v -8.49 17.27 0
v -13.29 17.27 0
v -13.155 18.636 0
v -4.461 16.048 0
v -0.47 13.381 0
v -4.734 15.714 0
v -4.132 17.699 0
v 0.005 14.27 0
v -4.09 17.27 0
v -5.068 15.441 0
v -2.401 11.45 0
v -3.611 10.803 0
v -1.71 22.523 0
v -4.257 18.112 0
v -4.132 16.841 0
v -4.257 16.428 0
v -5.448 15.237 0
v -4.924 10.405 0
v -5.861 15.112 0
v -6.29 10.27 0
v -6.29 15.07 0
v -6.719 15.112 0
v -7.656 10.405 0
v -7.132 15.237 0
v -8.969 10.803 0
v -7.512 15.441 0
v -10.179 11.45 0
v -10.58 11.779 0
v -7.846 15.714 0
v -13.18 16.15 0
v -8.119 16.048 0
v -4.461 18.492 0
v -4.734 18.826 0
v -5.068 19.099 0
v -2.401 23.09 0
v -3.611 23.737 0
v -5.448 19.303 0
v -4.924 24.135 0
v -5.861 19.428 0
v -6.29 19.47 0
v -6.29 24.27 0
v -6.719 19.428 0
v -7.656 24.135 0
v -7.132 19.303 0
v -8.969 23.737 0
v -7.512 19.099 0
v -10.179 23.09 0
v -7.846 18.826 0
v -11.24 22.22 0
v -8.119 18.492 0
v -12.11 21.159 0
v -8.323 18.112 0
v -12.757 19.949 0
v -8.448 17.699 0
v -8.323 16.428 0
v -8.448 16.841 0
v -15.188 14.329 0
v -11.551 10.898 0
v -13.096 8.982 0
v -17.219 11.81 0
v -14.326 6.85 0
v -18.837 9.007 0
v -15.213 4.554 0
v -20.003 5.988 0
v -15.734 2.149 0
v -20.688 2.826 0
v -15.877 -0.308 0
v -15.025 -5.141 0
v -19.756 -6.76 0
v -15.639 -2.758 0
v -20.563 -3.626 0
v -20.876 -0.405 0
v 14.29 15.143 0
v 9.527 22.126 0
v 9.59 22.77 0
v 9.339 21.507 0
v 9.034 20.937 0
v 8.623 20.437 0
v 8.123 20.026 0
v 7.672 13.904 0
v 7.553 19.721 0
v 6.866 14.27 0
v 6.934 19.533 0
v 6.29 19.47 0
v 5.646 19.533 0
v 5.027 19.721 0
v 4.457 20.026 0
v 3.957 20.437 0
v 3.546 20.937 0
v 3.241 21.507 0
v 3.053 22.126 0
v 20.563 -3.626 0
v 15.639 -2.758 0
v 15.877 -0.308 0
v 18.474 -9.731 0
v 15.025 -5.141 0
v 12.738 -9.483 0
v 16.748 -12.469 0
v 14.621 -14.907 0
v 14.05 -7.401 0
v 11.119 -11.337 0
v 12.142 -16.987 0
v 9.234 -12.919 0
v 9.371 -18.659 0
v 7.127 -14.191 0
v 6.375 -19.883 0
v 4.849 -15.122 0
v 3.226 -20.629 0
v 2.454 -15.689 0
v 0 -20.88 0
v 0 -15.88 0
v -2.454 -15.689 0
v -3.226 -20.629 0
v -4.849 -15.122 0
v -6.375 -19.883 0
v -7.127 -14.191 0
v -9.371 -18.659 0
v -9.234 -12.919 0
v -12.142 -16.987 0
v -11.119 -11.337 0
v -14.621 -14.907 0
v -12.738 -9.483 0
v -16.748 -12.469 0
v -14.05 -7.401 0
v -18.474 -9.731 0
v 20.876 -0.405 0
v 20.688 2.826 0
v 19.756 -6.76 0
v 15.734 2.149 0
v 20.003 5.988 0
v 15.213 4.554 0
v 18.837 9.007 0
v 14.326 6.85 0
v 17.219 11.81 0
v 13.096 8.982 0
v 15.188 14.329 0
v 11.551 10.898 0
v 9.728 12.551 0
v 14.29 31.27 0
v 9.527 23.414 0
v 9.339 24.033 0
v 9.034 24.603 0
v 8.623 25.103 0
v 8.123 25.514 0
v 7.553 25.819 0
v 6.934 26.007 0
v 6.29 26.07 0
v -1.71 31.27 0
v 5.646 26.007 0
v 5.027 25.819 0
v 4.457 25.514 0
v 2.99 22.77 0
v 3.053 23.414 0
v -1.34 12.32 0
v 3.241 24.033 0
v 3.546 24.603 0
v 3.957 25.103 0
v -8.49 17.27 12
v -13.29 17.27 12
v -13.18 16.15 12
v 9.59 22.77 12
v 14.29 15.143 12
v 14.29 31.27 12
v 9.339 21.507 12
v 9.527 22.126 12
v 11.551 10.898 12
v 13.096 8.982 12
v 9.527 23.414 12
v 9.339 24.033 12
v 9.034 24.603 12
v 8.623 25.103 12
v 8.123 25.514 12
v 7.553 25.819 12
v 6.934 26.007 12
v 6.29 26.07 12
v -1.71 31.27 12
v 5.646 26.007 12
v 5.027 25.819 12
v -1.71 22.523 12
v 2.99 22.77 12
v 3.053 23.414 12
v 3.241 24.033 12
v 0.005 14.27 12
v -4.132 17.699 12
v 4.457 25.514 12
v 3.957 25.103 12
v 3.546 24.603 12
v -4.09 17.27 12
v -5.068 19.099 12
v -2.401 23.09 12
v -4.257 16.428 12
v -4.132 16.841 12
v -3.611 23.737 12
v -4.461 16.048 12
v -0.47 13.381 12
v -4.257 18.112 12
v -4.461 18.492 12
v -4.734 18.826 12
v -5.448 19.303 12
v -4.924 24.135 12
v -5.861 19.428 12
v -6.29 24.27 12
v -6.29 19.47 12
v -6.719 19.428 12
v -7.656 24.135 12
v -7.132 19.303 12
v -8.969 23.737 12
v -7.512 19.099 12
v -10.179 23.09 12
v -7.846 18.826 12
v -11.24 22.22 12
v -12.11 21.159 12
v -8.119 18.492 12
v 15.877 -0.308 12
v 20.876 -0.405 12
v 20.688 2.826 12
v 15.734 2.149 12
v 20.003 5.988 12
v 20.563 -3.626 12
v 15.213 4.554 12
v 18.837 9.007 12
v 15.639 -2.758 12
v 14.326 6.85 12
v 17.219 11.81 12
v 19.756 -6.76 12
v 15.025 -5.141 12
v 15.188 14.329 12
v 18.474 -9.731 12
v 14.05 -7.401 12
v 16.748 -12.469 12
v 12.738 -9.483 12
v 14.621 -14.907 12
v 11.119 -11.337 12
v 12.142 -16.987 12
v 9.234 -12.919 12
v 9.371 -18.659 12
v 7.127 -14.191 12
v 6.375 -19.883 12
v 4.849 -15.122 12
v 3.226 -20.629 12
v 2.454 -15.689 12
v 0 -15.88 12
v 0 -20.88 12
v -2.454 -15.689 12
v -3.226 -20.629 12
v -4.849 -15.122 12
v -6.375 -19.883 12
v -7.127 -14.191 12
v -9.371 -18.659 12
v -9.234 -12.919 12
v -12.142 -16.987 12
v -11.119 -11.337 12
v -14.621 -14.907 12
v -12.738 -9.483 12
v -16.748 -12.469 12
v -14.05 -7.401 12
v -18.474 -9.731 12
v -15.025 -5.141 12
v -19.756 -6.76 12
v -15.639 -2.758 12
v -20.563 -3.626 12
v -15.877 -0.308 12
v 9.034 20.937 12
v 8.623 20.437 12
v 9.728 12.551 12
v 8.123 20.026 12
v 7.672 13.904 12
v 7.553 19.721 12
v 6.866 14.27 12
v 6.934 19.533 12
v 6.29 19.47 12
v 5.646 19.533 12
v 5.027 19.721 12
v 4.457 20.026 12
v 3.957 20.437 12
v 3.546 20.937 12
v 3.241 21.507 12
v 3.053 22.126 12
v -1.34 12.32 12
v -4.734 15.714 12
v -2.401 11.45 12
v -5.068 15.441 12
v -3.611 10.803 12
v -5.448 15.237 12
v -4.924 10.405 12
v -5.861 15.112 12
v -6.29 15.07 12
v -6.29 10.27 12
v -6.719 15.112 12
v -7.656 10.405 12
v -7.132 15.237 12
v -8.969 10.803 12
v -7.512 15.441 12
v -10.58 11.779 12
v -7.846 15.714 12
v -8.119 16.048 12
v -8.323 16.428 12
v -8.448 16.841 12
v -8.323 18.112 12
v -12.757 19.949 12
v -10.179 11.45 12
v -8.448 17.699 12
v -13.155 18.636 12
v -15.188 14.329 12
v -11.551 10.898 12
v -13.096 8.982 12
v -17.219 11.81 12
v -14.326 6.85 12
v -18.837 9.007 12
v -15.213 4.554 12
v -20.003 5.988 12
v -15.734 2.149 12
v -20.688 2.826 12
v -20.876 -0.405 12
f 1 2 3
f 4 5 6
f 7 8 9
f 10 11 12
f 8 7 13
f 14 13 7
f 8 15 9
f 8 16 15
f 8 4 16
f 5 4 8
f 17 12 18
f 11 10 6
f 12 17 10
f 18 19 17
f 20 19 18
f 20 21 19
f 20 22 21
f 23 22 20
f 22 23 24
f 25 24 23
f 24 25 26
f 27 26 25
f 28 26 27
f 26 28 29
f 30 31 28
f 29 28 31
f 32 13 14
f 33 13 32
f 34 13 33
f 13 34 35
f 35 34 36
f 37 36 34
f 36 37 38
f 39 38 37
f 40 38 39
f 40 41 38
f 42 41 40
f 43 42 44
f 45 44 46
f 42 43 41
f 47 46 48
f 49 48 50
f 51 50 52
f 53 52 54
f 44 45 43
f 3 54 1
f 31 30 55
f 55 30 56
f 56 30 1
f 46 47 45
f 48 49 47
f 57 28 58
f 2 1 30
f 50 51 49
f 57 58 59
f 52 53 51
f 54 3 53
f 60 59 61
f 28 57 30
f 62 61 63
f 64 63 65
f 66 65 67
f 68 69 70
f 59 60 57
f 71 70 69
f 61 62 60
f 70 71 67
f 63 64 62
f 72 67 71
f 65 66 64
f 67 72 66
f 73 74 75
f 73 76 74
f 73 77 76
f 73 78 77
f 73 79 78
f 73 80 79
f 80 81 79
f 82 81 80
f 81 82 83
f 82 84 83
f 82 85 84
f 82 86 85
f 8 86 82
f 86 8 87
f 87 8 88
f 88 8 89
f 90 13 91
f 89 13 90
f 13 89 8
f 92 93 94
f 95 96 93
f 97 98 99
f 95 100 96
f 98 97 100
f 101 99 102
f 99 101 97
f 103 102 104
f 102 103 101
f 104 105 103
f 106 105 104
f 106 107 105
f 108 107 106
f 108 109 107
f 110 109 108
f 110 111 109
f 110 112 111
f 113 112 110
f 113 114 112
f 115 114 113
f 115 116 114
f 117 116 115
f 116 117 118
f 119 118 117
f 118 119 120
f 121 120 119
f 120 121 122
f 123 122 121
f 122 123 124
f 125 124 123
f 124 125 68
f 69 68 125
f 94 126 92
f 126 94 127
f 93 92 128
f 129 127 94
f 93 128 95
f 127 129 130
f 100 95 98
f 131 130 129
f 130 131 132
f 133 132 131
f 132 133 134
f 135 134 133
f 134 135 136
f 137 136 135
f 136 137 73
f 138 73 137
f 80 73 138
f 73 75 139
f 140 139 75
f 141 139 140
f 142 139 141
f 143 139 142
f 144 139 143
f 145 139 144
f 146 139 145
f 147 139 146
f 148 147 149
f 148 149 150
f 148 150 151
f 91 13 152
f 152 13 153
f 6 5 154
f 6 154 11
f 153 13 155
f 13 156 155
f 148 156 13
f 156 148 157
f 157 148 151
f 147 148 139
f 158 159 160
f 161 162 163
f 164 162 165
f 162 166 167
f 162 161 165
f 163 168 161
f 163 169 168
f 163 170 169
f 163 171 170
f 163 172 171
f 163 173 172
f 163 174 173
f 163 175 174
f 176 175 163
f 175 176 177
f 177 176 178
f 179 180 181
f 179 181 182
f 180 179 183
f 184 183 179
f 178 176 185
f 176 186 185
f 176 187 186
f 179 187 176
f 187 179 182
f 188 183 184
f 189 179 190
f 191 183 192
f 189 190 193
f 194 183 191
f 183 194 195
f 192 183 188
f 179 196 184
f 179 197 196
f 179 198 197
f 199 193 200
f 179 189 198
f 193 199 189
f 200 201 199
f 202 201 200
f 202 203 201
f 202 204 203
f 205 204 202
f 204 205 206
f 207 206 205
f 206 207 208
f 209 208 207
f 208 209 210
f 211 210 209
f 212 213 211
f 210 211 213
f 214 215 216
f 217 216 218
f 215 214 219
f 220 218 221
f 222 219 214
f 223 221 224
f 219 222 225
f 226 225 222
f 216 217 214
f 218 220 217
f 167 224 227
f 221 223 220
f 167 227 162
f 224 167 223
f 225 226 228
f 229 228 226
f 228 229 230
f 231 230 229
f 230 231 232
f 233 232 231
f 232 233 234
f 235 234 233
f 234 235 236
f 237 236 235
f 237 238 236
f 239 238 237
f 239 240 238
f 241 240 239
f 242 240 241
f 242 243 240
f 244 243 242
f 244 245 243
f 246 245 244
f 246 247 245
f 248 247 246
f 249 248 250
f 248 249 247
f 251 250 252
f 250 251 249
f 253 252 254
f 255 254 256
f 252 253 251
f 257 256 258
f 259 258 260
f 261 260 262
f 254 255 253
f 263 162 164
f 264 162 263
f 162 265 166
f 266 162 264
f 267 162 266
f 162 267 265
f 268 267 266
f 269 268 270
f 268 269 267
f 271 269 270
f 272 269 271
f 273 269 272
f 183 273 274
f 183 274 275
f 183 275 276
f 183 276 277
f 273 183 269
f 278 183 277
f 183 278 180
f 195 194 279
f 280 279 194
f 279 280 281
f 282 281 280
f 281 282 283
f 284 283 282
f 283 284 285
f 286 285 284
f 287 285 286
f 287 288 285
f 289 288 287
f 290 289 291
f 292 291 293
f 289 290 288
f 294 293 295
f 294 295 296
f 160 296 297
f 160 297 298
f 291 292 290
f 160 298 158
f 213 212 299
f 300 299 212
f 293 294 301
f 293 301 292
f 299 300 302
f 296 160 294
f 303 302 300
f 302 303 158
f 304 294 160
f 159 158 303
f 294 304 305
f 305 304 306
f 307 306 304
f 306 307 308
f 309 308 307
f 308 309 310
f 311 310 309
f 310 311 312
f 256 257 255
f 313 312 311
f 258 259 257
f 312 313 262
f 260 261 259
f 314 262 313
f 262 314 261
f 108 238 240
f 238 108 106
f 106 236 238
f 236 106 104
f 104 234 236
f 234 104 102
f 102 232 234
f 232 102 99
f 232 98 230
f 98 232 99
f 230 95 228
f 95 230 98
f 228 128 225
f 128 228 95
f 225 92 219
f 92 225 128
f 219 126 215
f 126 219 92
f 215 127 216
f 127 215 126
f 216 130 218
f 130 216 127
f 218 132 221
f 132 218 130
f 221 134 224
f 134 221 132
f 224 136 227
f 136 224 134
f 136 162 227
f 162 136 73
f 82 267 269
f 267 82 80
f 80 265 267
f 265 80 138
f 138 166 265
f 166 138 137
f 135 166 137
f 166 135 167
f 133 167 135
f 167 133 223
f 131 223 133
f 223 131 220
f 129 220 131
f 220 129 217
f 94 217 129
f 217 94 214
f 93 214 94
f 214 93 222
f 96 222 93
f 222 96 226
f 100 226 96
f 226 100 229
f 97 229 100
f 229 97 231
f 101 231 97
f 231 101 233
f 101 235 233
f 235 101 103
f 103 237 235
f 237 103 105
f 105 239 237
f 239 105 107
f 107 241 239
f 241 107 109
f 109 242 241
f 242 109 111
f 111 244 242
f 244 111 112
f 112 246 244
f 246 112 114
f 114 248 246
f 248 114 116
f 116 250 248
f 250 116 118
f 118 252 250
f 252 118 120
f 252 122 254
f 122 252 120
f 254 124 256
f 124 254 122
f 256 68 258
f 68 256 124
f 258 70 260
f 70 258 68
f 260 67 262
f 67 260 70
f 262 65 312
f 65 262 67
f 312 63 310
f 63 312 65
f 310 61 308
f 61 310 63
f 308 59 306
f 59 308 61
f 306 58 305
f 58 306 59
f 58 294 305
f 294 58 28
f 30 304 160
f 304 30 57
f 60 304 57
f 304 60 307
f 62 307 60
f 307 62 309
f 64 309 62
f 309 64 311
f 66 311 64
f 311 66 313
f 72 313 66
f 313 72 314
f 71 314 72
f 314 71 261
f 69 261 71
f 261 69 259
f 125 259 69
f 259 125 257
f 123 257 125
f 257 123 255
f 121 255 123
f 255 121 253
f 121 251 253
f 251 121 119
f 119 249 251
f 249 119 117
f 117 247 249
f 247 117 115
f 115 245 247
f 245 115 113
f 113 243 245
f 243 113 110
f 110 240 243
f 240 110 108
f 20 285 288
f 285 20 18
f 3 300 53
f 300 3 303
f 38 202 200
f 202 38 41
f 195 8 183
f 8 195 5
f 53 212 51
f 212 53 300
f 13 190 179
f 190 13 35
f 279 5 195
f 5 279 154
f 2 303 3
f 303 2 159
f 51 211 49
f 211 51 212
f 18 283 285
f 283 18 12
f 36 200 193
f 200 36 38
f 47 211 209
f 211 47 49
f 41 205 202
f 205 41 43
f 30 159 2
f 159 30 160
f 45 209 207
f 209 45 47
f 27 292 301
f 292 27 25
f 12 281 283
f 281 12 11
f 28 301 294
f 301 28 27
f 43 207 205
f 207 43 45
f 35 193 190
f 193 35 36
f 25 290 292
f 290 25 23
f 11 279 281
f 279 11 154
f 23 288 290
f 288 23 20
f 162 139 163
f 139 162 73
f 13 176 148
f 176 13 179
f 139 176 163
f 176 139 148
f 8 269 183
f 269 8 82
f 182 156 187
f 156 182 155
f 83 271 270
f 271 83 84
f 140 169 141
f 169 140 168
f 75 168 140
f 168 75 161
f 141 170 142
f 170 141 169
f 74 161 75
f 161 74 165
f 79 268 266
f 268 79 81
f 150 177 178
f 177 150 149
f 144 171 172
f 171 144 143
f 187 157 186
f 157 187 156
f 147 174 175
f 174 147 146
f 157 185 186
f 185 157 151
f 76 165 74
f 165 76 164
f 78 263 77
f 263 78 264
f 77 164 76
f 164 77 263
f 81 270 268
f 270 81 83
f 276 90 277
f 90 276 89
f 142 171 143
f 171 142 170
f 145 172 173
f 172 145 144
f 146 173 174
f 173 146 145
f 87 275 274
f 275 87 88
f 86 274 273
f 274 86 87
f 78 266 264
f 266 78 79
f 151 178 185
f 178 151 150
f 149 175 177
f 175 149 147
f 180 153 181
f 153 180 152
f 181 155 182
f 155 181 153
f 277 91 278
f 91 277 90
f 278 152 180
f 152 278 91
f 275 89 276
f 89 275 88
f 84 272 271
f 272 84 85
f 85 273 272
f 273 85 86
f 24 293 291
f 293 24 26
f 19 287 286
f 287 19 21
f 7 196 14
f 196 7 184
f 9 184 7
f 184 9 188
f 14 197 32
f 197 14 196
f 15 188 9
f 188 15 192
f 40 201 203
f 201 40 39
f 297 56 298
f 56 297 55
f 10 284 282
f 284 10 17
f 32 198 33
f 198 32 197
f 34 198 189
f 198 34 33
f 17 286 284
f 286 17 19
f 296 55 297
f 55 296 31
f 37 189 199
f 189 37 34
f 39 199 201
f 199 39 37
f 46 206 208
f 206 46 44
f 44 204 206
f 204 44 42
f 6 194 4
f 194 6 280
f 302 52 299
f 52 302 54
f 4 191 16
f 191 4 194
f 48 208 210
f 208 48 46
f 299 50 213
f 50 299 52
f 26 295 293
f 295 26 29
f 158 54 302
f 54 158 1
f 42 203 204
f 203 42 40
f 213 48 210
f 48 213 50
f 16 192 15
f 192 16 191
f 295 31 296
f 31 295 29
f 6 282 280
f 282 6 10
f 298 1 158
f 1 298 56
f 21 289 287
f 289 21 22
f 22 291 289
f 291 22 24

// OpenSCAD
$fn = 32;

// ----------------------------------------------------------------------
// Pipe clamp: 41.76 mm ring, 5 mm wall, 12 mm wide
// ----------------------------------------------------------------------

// --- parameters (mm) ---
outer_r = 20.88;          // clamp outside radius
inner_r = 15.88;          // pipe bore radius
band = 5;                 // band thickness
clamp_w = 12;             // clamp width
opening = 40;             // opening angle between the ends
lug_w = 16;               // lug width
lug_len = 17;             // lug length
bolt_d = 6.6;             // bolt hole
knuckle_d = 14;           // hinge knuckle diameter
pin_d = 4.4;              // hinge pin hole

clamp_profile = [[-7.141, 19.621], [-10.087, 18.282], [-12.791, 16.503], [-15.188, 14.329], [-17.219, 11.81], [-18.837, 9.007], [-20.003, 5.988], [-20.688, 2.826], [-20.876, -0.405], [-20.563, -3.626], [-19.756, -6.76], [-18.474, -9.731], [-16.748, -12.469], [-14.621, -14.907], [-12.142, -16.987], [-9.371, -18.659], [-6.375, -19.883], [-3.226, -20.629], [0, -20.88], [3.226, -20.629], [6.375, -19.883], [9.371, -18.659], [12.142, -16.987], [14.621, -14.907], [16.748, -12.469], [18.474, -9.731], [19.756, -6.76], [20.563, -3.626], [20.876, -0.405], [20.688, 2.826], [20.003, 5.988], [18.837, 9.007], [17.219, 11.81], [15.188, 14.329], [12.791, 16.503], [10.087, 18.282], [7.141, 19.621], [5.431, 14.922], [7.672, 13.904], [9.728, 12.551], [11.551, 10.898], [13.096, 8.982], [14.326, 6.85], [15.213, 4.554], [15.734, 2.149], [15.877, -0.308], [15.639, -2.758], [15.025, -5.141], [14.05, -7.401], [12.738, -9.483], [11.119, -11.337], [9.234, -12.919], [7.127, -14.191], [4.849, -15.122], [2.454, -15.689], [0, -15.88], [-2.454, -15.689], [-4.849, -15.122], [-7.127, -14.191], [-9.234, -12.919], [-11.119, -11.337], [-12.738, -9.483], [-14.05, -7.401], [-15.025, -5.141], [-15.639, -2.758], [-15.877, -0.308], [-15.734, 2.149], [-15.213, 4.554], [-14.326, 6.85], [-13.096, 8.982], [-11.551, 10.898], [-9.728, 12.551], [-7.672, 13.904], [-5.431, 14.922]];

difference() {
  union() {
    linear_extrude(height = clamp_w) polygon(clamp_profile);
    /* hinge knuckle, sunk 2 mm into the band end */
    translate([-6.29, 17.27, 0]) cylinder(h = clamp_w, d = knuckle_d);
    /* bolt lug on the other end */
    translate([-1.71, 14.27, 0]) cube([lug_w, 17, clamp_w]);
  }
  translate([6.29, 22.77, -2.5]) cylinder(h = clamp_w + 5, d = bolt_d);
  translate([-6.29, 17.27, -2.5]) cylinder(h = clamp_w + 5, d = pin_d);
}
